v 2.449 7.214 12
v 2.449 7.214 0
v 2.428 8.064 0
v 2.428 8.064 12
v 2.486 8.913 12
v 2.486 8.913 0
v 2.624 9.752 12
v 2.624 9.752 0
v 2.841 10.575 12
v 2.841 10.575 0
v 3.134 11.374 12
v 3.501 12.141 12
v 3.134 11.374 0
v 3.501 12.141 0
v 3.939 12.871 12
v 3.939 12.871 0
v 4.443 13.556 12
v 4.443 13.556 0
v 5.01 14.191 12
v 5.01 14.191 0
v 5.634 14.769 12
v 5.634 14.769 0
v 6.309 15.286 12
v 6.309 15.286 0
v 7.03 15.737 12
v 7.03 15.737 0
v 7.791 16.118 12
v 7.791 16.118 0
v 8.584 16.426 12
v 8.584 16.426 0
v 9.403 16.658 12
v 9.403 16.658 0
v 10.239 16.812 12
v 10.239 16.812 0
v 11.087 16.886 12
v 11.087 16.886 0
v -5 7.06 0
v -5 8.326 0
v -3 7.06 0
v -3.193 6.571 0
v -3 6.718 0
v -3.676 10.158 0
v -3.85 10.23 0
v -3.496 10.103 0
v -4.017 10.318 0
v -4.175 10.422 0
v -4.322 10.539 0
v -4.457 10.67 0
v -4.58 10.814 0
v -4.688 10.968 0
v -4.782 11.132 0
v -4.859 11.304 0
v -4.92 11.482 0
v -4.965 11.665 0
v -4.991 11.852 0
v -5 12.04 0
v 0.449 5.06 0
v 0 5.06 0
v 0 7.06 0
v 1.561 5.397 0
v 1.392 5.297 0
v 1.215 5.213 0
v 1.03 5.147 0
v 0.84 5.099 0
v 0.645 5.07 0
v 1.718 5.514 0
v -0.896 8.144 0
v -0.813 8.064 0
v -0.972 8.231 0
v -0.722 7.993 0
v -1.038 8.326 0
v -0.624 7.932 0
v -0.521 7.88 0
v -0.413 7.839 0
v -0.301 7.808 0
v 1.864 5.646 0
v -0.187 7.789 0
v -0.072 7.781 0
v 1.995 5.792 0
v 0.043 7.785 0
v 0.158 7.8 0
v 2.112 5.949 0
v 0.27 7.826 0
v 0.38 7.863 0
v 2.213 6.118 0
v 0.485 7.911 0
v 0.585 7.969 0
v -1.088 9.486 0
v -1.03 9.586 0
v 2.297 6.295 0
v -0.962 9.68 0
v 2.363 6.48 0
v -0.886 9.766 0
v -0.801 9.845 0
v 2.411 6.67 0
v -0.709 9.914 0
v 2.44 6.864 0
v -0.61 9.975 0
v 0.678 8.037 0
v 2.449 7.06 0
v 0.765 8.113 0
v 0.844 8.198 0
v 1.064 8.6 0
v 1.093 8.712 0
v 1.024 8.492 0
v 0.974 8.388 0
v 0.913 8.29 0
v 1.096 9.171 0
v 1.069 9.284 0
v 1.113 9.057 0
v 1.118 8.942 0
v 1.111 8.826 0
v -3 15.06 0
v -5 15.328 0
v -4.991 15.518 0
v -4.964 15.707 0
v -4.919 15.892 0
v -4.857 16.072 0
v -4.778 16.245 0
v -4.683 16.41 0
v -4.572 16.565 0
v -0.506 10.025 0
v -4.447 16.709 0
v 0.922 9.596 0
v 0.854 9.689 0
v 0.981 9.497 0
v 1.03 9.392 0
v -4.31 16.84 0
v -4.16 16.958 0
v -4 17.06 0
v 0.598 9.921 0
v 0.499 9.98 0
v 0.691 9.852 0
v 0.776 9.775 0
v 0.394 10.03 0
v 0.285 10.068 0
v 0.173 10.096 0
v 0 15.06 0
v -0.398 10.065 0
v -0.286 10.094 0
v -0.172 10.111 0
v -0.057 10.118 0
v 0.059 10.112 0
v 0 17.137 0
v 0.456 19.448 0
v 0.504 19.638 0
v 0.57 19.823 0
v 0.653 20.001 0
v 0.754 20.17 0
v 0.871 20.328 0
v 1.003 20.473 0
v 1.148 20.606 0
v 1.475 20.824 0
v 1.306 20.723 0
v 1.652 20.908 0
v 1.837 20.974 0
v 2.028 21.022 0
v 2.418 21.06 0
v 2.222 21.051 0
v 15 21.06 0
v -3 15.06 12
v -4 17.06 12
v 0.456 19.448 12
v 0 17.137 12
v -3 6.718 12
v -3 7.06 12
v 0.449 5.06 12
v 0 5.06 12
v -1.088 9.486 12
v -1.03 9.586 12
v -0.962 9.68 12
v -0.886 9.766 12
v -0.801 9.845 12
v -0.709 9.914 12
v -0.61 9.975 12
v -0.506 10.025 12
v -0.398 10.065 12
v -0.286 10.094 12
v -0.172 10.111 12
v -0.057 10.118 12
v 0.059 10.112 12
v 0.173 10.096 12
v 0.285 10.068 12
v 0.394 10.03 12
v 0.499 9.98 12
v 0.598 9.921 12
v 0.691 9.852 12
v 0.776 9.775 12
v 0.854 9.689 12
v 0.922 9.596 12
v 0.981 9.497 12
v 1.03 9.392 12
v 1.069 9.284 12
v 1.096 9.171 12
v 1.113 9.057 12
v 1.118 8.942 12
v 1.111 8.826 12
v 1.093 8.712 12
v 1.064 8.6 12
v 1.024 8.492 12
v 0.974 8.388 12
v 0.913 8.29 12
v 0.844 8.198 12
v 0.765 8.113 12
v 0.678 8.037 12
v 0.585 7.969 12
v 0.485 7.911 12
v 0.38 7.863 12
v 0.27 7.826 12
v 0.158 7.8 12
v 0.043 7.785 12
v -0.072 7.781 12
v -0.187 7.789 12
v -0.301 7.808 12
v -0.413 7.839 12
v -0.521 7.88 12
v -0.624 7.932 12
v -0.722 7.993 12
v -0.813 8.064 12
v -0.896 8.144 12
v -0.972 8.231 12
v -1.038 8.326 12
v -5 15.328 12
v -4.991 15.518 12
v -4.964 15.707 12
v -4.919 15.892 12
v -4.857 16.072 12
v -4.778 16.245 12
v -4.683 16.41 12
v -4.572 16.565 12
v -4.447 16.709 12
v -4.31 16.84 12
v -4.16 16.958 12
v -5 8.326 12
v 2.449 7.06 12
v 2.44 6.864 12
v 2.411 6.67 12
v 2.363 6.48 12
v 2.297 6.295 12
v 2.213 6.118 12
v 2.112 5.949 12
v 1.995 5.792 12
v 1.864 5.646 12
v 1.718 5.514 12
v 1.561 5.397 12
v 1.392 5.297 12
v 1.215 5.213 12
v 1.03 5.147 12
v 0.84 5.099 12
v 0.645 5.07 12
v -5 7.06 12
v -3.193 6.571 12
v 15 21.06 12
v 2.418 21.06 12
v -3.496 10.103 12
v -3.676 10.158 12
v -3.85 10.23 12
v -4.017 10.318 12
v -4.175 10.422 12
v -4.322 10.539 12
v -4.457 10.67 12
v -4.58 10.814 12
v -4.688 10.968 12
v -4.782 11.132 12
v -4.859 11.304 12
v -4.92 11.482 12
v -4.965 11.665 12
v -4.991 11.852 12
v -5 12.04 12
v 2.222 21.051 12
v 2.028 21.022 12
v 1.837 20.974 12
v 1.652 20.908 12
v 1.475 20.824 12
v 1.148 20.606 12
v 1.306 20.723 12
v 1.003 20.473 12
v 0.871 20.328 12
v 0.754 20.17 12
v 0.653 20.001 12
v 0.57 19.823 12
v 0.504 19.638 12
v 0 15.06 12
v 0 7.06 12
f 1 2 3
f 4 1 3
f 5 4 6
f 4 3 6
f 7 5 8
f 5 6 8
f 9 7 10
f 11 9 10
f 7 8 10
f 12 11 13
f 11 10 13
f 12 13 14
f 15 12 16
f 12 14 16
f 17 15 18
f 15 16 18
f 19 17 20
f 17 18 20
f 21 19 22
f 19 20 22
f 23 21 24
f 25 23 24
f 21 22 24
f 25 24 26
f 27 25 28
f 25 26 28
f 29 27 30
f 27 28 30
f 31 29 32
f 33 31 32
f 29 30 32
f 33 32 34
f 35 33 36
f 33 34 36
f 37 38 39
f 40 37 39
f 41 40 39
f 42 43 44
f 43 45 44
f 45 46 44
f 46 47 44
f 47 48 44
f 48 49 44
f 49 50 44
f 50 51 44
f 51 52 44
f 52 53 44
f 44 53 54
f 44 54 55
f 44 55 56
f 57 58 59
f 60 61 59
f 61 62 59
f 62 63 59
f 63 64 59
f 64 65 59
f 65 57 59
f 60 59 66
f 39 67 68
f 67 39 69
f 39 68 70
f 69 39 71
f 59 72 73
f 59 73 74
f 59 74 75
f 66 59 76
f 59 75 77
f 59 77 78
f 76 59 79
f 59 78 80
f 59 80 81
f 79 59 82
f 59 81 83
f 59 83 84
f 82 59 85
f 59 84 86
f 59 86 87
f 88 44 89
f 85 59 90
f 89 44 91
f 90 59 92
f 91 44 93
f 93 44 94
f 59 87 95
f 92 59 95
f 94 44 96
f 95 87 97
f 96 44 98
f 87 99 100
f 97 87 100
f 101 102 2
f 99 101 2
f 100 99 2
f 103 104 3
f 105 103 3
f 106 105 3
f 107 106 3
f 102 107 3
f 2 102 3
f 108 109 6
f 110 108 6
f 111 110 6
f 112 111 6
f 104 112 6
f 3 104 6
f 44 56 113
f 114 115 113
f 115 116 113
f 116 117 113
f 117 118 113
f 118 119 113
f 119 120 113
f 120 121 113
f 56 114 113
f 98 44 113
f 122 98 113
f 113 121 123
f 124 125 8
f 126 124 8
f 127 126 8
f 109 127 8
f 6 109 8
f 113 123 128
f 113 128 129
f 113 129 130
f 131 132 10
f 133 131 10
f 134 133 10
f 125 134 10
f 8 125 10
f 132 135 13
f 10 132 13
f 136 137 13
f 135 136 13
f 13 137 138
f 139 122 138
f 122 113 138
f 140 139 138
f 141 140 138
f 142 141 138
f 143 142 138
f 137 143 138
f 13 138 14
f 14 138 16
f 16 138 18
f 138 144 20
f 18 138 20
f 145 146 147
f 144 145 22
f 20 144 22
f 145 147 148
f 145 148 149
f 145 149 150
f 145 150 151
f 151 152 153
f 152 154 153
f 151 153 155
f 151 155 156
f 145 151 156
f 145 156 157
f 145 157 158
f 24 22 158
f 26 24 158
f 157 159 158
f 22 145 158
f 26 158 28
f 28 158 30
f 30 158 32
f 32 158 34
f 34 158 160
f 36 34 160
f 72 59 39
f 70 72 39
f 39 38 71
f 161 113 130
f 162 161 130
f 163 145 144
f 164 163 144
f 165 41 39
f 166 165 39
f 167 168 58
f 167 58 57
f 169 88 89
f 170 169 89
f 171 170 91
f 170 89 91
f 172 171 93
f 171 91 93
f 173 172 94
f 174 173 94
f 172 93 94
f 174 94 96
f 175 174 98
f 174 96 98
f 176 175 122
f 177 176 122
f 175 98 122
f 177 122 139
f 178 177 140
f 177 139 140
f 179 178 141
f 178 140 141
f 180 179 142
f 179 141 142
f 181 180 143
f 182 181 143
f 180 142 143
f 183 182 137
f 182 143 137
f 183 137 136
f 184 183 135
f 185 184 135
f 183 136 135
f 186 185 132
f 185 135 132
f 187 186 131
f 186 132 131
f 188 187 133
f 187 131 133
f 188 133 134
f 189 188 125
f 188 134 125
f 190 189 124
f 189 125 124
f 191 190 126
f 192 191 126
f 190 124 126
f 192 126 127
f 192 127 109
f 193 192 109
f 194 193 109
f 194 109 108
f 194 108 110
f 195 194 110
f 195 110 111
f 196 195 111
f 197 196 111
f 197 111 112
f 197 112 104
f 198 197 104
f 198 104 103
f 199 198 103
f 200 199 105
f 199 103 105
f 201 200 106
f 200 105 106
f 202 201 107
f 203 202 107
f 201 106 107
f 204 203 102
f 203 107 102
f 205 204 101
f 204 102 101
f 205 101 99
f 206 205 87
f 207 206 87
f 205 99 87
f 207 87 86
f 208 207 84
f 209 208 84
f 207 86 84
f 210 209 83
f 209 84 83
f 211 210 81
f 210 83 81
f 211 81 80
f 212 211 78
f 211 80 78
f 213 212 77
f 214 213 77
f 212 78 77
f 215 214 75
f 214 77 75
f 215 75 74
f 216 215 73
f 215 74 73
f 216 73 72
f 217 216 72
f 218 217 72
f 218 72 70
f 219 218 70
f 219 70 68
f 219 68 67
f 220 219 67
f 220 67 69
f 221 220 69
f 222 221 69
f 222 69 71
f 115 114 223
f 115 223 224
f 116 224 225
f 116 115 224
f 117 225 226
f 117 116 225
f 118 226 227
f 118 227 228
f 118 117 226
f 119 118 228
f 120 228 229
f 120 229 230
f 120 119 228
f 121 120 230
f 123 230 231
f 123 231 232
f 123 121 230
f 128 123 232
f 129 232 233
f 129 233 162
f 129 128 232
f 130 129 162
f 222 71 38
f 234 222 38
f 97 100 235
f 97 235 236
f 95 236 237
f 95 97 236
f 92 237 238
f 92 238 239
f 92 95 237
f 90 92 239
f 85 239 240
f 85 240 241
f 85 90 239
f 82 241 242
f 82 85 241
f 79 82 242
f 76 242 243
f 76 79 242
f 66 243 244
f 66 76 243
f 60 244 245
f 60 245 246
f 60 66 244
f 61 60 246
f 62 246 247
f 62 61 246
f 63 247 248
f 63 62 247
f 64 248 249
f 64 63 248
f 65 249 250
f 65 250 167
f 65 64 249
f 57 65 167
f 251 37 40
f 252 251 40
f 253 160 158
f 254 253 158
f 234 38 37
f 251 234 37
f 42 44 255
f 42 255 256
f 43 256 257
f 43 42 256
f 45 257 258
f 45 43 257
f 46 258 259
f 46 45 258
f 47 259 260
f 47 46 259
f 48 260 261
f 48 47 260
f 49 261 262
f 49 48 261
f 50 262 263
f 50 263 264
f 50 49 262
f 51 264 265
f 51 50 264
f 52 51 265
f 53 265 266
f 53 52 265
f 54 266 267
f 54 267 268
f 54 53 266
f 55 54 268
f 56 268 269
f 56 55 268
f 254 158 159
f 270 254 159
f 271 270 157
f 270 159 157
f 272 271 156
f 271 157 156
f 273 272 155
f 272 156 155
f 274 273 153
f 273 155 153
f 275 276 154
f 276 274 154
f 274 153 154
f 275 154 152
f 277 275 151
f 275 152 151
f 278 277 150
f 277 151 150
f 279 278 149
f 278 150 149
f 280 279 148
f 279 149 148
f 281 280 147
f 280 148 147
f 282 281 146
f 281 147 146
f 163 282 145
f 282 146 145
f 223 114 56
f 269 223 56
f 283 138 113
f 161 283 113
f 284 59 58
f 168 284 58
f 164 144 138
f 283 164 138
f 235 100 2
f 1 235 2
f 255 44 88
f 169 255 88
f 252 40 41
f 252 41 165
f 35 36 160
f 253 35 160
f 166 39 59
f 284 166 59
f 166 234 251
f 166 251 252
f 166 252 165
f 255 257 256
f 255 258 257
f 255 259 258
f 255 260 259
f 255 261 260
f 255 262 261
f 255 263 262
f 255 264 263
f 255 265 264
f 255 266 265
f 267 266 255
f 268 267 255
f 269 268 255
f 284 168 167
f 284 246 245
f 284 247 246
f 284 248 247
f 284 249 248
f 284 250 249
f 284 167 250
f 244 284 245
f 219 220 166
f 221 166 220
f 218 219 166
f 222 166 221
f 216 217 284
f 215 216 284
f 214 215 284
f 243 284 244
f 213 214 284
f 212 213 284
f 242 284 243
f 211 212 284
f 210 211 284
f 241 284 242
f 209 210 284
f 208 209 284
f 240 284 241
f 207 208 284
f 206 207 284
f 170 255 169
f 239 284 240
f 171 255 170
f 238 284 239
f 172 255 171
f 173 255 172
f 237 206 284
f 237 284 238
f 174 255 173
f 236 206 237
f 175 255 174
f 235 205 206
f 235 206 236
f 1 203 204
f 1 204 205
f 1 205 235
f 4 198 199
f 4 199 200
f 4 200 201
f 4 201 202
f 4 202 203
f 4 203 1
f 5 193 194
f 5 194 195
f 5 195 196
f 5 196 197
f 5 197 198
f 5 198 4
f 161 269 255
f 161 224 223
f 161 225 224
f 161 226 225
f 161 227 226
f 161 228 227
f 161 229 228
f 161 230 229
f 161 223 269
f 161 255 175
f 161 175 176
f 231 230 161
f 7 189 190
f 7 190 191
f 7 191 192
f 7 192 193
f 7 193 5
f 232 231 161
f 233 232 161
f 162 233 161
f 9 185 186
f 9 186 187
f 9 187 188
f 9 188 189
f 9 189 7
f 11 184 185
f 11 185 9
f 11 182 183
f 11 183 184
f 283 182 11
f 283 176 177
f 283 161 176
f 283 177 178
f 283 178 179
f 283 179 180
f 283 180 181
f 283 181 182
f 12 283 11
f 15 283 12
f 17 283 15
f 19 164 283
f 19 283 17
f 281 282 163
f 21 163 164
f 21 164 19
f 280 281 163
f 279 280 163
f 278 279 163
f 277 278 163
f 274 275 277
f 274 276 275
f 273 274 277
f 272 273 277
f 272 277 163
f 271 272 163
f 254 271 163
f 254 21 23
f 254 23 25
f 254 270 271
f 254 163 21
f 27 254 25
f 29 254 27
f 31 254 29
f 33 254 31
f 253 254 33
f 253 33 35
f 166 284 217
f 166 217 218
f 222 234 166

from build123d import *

# Parameters (mm, degrees)
F1_DEPTH    = 12
F2_T1_DEPTH = 22
F2_T3_DEPTH = 20.6602540378
F2_T5_DEPTH = 20.219219555
F2_T7_DEPTH = 19.7630643448
F3_SIZE     = 0.2


# Not quite as in the source:
# - a fillet or chamfer that OpenCascade refuses, or shapes differently, is made with other operations: its cross-section is extruded or revolved along the edge and cut away or added


with BuildPart() as f1:
    # F0 (on Top) → F1 (new body)
    with BuildSketch(Plane.XY):
        with BuildLine():
            Line((0, 17.1366985887), (0, 15.0604258217))
            Line((0, 15.0604258217), (-3, 15.0604258217))
            Line((-3, 15.0604258217), (-4, 17.0604258217))
            Line((-4, 17.0604258217), (-5, 17.0604258217))
            Line((-5, 17.0604258217), (-5, 10.4876235127))
            Line((-5, 10.4876235127), (-1.0879496576, 9.4864424318))
            ThreePointArc((-1.0879496576, 9.4864424318), (1.1165361393, 8.9993738808), (-1.0382550692, 8.3256764337))
            Line((-1.0382550692, 8.3256764337), (-5, 8.3256764337))
            Line((-5, 8.3256764337), (-5, 7.6356520876))
            Line((-5, 7.6356520876), (-5, 7.0604258217))
            Line((-5, 7.0604258217), (-3, 6.5184039995))
            Line((-3, 6.5184039995), (-3, 7.0604258217))
            Line((-3, 7.0604258217), (0, 7.0604258217))
            Line((0, 7.0604258217), (0, 5.0604258217))
            Line((0, 5.0604258217), (2.4494461788, 5.0604258217))
            Line((2.4494461788, 5.0604258217), (2.4494461788, 7.2136978708))
            ThreePointArc((2.4494461788, 7.2136978708), (4.7188246076, 13.8799594264), (11.0867818181, 16.8863264277))
            Line((11.0867818181, 16.8863264277), (15, 21.0604258217))
            Line((15, 21.0604258217), (2.1266145632, 21.0604258217))
            Line((2.1266145632, 21.0604258217), (0.7744232425, 21.0604258217))
            Line((0.7744232425, 21.0604258217), (0, 17.1366985887))
        make_face()
    extrude(amount=F1_DEPTH)

    # F2: fillet of radius 2 on 4 edges, made by hand

    # F2_s2 → F2_t1 (cut)
    with BuildSketch(Plane.XY.offset(-5)):
        with BuildLine():
            ThreePointArc((2.4494461788, 7.0604258217), (1.8636597412, 5.6462122593), (0.4494461788, 5.0604258217))
            Line((0.4494461788, 5.0604258217), (2.4494461788, 5.0604258217))
            Line((2.4494461788, 5.0604258217), (2.4494461788, 7.0604258217))
        make_face()
    extrude(amount=F2_T1_DEPTH, mode=Mode.SUBTRACT)

    # F2_s4 → F2_t3 (cut)
    with BuildSketch(Plane.XY.offset(-4.3301270189)):
        with BuildLine():
            ThreePointArc((-5, 15.3283750141), (-4.7320508076, 16.3283750141), (-4, 17.0604258217))
            Line((-4, 17.0604258217), (-5, 17.0604258217))
            Line((-5, 17.0604258217), (-5, 15.3283750141))
        make_face()
    extrude(amount=F2_T3_DEPTH, mode=Mode.SUBTRACT)

    # F2_s6 → F2_t5 (cut)
    with BuildSketch(Plane.XY.offset(-4.1096097775)):
        with BuildLine():
            ThreePointArc((2.4182671536, 21.0604258217), (1.1483331779, 20.6055043625), (0.4561194194, 19.4476935191))
            Line((0.4561194194, 19.4476935191), (0.7744232425, 21.0604258217))
            Line((0.7744232425, 21.0604258217), (2.4182671536, 21.0604258217))
        make_face()
    extrude(amount=F2_T5_DEPTH, mode=Mode.SUBTRACT)

    # F2_s8 → F2_t7 (cut)
    with BuildSketch(Plane.XY.offset(-3.8815321724)):
        with BuildLine():
            ThreePointArc((-3.4958636049, 10.1026814056), (-4.5798302456, 10.8138039967), (-5, 12.0402363817))
            Line((-5, 12.0402363817), (-5, 10.4876235127))
            Line((-5, 10.4876235127), (-3.4958636049, 10.1026814056))
        make_face()
    extrude(amount=F2_T7_DEPTH, mode=Mode.SUBTRACT)

    # F3
    f3_edges = [f1.edges().sort_by_distance(p)[0] for p in [
        (-3, 6.518404, 6),
    ]]
    chamfer(f3_edges, length=F3_SIZE)


solid = f1.part
